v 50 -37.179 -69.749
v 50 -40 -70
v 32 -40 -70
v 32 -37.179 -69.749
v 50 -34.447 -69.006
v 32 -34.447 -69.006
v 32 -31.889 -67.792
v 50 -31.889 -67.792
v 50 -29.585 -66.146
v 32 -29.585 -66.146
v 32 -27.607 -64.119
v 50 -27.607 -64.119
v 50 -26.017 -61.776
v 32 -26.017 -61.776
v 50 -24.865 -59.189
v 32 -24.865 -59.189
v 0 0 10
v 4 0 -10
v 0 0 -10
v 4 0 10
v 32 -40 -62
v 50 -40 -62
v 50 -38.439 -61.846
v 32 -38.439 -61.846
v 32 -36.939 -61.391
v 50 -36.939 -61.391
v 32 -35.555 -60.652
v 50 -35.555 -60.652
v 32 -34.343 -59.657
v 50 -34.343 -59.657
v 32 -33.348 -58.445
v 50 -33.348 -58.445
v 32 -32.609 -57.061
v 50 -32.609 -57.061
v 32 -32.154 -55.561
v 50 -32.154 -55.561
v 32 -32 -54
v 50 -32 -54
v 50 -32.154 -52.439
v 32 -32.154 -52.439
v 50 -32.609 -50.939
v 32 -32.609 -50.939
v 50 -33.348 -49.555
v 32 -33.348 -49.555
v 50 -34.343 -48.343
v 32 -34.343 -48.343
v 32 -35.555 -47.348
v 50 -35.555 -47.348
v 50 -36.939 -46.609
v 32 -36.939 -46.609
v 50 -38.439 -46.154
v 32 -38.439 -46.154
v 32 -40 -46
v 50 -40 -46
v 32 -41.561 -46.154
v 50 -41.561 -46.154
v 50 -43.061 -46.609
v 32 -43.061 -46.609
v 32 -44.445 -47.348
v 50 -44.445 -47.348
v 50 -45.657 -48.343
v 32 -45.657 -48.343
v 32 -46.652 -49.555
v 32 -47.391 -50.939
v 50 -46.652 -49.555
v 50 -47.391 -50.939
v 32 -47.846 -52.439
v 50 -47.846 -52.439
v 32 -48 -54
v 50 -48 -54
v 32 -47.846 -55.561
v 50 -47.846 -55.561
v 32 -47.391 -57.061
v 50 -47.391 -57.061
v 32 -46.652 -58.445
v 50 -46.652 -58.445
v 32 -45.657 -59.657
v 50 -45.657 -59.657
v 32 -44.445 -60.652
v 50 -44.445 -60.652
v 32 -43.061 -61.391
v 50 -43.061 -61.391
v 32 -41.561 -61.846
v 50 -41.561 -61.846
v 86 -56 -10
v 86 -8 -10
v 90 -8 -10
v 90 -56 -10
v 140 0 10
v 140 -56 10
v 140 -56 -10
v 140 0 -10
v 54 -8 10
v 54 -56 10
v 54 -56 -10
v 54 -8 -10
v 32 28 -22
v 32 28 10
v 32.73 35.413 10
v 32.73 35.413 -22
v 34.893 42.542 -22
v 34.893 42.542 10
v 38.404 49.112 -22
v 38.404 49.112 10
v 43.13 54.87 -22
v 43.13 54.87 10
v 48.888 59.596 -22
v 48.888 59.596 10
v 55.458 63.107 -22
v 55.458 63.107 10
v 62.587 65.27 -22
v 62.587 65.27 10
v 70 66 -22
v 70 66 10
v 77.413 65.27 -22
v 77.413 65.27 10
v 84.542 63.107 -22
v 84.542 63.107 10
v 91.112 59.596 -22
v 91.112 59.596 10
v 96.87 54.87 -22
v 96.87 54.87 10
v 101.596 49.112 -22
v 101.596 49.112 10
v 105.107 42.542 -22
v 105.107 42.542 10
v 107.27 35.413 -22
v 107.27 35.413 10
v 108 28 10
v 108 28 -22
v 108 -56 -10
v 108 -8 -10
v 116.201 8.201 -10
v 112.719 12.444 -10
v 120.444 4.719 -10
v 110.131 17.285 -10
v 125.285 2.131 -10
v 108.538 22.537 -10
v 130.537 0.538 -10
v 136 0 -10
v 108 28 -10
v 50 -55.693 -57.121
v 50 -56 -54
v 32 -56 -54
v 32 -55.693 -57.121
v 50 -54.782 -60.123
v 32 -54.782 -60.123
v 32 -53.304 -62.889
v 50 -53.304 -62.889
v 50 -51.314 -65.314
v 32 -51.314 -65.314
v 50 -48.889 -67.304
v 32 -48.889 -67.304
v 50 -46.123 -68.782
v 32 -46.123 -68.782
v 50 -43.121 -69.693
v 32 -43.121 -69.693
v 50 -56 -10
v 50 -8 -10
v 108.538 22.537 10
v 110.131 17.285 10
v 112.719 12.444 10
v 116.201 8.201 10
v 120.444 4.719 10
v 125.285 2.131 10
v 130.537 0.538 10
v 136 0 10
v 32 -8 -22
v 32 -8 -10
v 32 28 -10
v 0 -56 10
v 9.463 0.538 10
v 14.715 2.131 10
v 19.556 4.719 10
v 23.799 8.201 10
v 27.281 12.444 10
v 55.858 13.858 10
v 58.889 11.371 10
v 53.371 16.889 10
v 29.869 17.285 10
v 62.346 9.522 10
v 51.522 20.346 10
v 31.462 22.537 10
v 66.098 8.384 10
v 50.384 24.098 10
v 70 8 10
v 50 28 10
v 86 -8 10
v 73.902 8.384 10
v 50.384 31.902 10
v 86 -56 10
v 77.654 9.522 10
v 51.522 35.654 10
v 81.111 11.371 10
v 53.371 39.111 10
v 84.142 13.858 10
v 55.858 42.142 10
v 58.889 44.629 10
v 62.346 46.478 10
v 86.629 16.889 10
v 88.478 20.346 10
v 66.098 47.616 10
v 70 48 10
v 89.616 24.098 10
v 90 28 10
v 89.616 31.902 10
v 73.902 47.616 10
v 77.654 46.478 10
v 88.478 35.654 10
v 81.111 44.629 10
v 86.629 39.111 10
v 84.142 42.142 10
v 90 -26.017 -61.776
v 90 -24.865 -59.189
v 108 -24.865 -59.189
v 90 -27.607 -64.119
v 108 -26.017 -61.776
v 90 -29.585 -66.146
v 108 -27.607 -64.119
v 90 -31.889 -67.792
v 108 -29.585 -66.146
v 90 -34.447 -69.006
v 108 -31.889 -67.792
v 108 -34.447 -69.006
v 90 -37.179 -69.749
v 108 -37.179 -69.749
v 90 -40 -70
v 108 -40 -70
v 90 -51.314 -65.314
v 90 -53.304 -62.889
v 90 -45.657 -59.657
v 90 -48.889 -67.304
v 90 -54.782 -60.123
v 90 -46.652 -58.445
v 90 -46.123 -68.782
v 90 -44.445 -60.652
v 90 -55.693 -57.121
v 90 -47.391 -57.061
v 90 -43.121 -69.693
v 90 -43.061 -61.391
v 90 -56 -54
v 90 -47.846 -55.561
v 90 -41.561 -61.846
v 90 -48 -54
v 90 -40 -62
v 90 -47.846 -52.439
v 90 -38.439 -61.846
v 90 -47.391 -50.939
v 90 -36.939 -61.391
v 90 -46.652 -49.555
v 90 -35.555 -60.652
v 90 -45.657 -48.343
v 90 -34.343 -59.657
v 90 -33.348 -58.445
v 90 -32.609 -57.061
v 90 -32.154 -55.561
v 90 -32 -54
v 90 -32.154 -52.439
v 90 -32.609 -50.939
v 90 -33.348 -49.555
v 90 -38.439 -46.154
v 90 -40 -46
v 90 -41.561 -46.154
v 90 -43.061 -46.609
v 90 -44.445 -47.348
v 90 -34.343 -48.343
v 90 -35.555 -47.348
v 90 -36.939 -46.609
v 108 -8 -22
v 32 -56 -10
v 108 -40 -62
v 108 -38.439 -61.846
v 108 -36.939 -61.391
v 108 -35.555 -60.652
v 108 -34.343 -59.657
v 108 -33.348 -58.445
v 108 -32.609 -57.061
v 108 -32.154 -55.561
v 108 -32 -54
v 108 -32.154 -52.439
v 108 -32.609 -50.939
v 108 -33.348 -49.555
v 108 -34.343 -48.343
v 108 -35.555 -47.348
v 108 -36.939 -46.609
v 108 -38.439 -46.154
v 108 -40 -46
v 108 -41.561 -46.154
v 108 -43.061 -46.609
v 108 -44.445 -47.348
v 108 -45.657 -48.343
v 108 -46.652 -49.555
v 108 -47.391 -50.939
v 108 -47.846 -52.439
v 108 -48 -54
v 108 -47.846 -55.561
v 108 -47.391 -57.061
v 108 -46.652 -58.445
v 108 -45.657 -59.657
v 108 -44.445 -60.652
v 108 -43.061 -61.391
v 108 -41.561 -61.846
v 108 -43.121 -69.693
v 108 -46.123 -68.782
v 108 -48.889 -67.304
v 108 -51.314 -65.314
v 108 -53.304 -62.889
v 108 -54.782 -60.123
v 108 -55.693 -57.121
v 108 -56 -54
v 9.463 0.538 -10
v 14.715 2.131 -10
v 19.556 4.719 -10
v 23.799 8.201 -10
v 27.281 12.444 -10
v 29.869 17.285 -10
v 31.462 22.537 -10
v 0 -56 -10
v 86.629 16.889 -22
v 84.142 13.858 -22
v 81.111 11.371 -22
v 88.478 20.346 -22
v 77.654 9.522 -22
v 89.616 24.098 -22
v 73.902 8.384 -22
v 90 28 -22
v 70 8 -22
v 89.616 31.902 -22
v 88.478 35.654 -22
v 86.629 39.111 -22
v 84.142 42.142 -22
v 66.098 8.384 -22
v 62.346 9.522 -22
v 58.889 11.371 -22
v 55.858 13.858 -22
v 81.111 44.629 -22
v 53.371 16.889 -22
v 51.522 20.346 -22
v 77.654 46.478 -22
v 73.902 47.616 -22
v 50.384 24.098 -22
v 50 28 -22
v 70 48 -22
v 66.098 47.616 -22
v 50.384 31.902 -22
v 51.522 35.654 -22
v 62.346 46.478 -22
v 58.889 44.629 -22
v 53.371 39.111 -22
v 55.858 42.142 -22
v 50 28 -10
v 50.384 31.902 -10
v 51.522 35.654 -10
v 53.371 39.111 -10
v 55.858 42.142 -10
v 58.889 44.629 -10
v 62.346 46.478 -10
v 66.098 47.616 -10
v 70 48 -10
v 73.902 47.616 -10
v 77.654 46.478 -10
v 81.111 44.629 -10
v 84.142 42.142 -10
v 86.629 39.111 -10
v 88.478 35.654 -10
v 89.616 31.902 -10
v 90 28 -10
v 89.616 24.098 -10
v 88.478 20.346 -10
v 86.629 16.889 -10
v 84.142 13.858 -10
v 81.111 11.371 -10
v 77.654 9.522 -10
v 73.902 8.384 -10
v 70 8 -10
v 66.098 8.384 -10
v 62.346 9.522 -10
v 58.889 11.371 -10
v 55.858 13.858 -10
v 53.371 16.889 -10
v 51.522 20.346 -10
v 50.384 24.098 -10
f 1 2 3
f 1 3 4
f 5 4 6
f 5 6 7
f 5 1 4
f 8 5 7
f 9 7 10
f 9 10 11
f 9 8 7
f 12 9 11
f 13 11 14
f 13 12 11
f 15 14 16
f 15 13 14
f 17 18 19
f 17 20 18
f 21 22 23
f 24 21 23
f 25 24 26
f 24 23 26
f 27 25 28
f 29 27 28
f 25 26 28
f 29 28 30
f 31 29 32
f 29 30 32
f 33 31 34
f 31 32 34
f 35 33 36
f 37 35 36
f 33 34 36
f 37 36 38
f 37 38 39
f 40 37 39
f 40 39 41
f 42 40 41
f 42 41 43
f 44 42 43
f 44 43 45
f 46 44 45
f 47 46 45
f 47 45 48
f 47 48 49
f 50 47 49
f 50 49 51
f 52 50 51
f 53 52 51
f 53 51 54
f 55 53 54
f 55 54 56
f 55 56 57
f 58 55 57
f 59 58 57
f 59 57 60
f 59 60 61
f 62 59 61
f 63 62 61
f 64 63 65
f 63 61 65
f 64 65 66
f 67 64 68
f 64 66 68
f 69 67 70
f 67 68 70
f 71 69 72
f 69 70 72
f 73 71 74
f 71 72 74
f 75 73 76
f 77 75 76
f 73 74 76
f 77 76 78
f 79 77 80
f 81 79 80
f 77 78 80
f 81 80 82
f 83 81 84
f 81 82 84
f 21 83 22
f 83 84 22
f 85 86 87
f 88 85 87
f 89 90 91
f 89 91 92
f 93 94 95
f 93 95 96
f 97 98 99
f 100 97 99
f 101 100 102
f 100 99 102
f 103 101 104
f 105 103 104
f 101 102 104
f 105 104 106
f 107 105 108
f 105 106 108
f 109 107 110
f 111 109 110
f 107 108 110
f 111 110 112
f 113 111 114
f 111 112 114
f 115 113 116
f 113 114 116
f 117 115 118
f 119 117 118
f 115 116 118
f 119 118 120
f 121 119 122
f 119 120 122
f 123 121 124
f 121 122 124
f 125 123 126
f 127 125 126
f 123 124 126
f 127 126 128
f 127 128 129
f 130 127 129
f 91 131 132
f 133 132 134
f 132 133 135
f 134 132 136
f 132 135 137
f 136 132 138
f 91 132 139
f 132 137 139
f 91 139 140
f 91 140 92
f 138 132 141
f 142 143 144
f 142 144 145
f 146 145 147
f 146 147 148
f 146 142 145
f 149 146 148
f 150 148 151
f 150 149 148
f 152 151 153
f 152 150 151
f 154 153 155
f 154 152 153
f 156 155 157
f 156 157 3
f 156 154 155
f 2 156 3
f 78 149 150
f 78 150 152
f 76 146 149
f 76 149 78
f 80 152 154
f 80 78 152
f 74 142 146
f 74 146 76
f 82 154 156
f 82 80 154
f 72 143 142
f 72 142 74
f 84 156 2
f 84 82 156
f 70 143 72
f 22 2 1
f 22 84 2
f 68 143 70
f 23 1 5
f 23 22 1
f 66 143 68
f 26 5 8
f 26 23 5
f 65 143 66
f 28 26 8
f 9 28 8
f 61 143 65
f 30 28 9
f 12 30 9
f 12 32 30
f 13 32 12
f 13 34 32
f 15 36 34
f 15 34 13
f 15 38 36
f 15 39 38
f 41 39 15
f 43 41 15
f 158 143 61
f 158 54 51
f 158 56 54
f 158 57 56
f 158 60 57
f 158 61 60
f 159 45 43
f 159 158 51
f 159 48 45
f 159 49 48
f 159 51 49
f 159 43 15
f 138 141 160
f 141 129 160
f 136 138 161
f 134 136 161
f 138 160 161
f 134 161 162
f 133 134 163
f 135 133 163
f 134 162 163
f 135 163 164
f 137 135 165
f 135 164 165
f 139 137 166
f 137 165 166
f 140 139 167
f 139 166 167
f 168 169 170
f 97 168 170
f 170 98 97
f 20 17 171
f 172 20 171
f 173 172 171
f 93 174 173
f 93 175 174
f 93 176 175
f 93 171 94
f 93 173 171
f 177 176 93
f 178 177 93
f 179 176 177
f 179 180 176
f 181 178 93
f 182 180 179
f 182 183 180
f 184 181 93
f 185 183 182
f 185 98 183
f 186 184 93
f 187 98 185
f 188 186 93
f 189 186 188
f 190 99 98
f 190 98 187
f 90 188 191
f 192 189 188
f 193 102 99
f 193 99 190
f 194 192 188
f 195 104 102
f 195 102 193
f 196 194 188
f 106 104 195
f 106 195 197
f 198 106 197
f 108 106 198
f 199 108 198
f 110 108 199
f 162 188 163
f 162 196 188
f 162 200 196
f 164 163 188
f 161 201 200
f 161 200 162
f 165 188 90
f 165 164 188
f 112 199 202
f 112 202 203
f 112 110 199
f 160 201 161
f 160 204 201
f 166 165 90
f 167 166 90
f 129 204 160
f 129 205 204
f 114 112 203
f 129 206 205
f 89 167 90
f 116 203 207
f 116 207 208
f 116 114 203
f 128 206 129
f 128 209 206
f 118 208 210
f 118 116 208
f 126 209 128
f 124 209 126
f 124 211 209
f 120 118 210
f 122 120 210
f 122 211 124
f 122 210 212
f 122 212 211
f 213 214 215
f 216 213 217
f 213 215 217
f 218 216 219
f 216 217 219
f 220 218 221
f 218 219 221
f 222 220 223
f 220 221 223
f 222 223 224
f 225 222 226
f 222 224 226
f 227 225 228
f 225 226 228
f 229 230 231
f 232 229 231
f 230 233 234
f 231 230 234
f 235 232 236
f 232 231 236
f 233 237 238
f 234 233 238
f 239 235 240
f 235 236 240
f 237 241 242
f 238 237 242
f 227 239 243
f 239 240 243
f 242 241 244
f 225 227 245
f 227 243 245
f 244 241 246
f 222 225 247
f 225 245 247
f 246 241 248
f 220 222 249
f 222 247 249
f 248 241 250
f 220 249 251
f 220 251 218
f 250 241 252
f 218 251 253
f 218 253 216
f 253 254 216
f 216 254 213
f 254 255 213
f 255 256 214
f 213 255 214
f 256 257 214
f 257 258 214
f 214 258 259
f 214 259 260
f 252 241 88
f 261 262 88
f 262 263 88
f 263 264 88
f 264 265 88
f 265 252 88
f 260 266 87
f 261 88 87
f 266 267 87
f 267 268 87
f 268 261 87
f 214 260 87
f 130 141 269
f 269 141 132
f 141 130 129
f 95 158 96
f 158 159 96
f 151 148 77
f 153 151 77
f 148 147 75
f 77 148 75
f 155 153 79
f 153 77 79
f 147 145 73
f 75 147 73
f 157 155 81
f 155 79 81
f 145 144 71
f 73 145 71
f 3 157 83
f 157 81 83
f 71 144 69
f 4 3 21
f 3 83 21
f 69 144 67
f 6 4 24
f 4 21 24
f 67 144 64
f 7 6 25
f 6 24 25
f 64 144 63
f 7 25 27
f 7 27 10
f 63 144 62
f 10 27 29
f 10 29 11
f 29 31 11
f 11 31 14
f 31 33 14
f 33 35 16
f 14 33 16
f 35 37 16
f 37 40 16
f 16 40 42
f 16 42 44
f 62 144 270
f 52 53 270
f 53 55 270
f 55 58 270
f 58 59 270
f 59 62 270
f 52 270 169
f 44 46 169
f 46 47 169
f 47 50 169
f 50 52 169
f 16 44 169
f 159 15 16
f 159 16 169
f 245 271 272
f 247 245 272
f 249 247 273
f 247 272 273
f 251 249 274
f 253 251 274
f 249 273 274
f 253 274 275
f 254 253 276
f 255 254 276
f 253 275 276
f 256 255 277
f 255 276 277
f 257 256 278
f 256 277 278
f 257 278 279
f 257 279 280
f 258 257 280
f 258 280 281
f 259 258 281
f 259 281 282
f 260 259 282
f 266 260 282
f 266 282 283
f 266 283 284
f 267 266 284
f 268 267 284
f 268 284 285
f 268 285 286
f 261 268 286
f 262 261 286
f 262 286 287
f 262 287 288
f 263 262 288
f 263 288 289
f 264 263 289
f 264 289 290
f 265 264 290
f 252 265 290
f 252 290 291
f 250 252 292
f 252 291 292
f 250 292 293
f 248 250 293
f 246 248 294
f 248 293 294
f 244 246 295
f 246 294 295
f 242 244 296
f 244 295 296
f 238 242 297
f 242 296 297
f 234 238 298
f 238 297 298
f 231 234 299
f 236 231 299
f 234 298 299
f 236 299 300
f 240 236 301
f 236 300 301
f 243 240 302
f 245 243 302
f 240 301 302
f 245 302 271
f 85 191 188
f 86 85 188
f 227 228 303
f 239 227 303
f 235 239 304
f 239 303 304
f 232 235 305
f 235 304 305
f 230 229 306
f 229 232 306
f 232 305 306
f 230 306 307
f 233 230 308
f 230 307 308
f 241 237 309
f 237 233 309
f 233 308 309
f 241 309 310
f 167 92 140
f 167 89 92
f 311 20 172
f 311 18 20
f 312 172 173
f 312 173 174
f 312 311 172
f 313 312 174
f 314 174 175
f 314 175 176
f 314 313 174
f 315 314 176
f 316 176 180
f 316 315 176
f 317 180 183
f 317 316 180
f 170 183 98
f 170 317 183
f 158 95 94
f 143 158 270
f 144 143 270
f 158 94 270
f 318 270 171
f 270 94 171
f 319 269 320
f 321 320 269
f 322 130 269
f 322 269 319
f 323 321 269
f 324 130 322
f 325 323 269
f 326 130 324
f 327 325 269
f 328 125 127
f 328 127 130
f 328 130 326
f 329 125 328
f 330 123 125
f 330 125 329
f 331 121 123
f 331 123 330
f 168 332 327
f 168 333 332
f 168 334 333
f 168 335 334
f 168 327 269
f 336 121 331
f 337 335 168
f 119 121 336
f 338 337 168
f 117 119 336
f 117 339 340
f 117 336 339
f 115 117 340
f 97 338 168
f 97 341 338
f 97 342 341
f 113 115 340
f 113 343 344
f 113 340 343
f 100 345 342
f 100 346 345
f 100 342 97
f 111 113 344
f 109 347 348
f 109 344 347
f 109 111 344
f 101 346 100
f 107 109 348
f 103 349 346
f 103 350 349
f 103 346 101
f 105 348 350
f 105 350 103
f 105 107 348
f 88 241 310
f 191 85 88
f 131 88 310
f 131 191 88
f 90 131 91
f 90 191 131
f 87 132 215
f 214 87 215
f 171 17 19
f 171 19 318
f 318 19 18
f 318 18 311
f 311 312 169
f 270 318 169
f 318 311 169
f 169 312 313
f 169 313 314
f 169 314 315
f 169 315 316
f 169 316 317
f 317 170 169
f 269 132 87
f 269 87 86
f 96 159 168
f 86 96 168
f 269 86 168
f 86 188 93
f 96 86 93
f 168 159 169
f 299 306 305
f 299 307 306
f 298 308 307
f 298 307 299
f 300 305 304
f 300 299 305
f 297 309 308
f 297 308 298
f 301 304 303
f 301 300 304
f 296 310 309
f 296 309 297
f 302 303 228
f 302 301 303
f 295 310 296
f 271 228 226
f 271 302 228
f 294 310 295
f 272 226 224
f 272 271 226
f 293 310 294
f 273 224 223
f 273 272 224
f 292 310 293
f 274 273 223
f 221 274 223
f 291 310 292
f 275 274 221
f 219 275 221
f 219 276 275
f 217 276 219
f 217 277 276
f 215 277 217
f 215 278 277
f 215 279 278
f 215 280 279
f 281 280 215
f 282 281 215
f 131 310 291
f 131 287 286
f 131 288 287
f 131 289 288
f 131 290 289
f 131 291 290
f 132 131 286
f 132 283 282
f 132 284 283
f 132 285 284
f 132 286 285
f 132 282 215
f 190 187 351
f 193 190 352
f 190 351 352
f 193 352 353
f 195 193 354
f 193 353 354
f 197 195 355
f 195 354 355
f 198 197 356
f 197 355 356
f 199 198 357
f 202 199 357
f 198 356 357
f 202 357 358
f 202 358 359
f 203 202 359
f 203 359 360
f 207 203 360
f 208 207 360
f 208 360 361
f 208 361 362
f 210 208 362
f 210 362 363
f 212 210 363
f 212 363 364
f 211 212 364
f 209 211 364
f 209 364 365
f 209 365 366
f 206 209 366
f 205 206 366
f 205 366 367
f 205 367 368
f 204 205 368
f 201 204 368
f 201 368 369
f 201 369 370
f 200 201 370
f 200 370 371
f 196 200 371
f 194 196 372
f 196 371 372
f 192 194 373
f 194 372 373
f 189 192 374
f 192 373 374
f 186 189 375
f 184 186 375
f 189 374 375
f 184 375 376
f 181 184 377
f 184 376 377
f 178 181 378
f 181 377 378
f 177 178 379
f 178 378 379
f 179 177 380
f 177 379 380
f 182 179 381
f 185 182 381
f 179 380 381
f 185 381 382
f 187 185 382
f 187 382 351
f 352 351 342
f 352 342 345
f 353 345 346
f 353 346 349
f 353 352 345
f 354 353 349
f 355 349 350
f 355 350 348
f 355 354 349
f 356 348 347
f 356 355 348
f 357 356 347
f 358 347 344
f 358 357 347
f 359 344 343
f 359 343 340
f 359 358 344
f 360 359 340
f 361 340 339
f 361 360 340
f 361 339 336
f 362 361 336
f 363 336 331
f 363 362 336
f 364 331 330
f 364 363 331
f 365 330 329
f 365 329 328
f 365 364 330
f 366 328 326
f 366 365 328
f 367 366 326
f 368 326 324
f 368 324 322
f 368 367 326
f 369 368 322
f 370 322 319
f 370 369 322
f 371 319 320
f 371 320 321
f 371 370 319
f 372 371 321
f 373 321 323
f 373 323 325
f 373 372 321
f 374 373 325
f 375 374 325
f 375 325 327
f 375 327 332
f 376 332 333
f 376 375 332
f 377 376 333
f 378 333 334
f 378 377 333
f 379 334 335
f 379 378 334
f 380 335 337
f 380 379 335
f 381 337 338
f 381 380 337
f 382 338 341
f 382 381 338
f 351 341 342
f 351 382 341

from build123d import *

# Parameters (mm, degrees)
BOSS_EXTRUDE2_DEPTH = 10
FILLET3_R           = 28
SKETCH4_W           = 22
SKETCH4_H           = 48
BOSS_EXTRUDE4_DEPTH = 20
SKETCH9_W           = 18
SKETCH9_H           = 48
BOSS_EXTRUDE6_DEPTH = 60
CUT_EXTRUDE2_DEPTH  = 60
SKETCH12_W          = 18
SKETCH12_H          = 48
BOSS_EXTRUDE7_DEPTH = 60
CUT_EXTRUDE3_START  = -60
CUT_EXTRUDE3_DEPTH  = 60
SKETCH14_R          = 8
CUT_EXTRUDE4_DEPTH  = 140
SKETCH15_R          = 20
CUT_EXTRUDE5_DEPTH  = 140
SKETCH18_R          = 20
BOSS_EXTRUDE9_DEPTH = 12


with BuildPart() as part:
    # Sketch2 → Boss-Extrude2 (new, symmetric)
    with BuildSketch(Plane.XY):
        with BuildLine():
            Line((32, 0), (0, 0))
            Line((0, 0), (0, -56))
            Line((0, -56), (32, -56))
            Line((32, -56), (32, -8))
            Line((32, -8), (89.338383838, -8))
            Line((89.338383838, -8), (108, -8))
            Line((108, -8), (108, -56))
            Line((108, -56), (140, -56))
            Line((140, -56), (140, 0))
            Line((140, 0), (108, 0))
            Line((108, 0), (108, 28))
            ThreePointArc((108, 28), (70, 66), (32, 28))
            Line((32, 28), (32, 0))
        make_face()
    extrude(amount=BOSS_EXTRUDE2_DEPTH, both=True)

    # Fillet3
    fillet3_edges = [part.edges().sort_by_distance(p)[0] for p in [
        (32, 0, 0),
        (108, 0, 0),
    ]]
    fillet(fillet3_edges, radius=FILLET3_R - 0.0001)  # a hair under: the kernel refuses the full size

    # Sketch4 → Boss-Extrude4 (add, through all)
    with BuildSketch(Plane.XY.offset(10)):
        with Locations((97, -32)):
            Rectangle(SKETCH4_W, SKETCH4_H)
        with Locations((43, -32)):
            Rectangle(SKETCH4_W, SKETCH4_H)
    extrude(amount=-BOSS_EXTRUDE4_DEPTH)

    # Sketch9 → Boss-Extrude6 (add)
    with BuildSketch(Plane(origin=(0, 0, -10), x_dir=(-1, 0, 0), z_dir=(0, 0, -1))):
        with Locations((-99, -32)):
            Rectangle(SKETCH9_W, SKETCH9_H)
    extrude(amount=BOSS_EXTRUDE6_DEPTH)

    # Sketch10 → Cut-Extrude2 (cut)
    with BuildSketch(Plane(origin=(108, 0, 0), x_dir=(0, 0, -1), z_dir=(1, 0, 0))):
        with BuildLine():
            Line((70, -8), (10, -8))
            Line((10, -8), (59.189189189, -24.864864865))
            ThreePointArc((59.189189189, -24.864864865), (67.019735539, -30.7001889), (70, -40))
            Line((70, -40), (70, -8))
        make_face()
        with BuildLine():
            Line((70, -56), (70, -40))
            ThreePointArc((70, -40), (65.313708499, -51.313708499), (54, -56))
            Line((54, -56), (70, -56))
        make_face()
    extrude(amount=-CUT_EXTRUDE2_DEPTH, mode=Mode.SUBTRACT)

    # Sketch12 → Boss-Extrude7 (add)
    with BuildSketch(Plane(origin=(0, 0, -10), x_dir=(-1, 0, 0), z_dir=(0, 0, -1))):
        with Locations((-41, -32)):
            Rectangle(SKETCH12_W, SKETCH12_H)
    extrude(amount=BOSS_EXTRUDE7_DEPTH)

    # Sketch13 → Cut-Extrude3 (cut)
    with BuildSketch(Plane.ZY.offset(-32).offset(CUT_EXTRUDE3_START)):
        with BuildLine():
            Line((-70, -8), (-70, -40))
            ThreePointArc((-70, -40), (-67.019735539, -30.7001889), (-59.189189189, -24.864864865))
            Line((-59.189189189, -24.864864865), (-10, -8))
            Line((-10, -8), (-70, -8))
        make_face()
        with BuildLine():
            Line((-70, -40), (-70, -56))
            Line((-70, -56), (-54, -56))
            ThreePointArc((-54, -56), (-65.313708499, -51.313708499), (-70, -40))
        make_face()
    extrude(amount=CUT_EXTRUDE3_DEPTH, mode=Mode.SUBTRACT)

    # Sketch14 → Cut-Extrude4 (cut)
    with BuildSketch(Plane(origin=(108, 0, 0), x_dir=(0, 0, -1), z_dir=(1, 0, 0))):
        with Locations((54, -40)):
            Circle(SKETCH14_R)
    extrude(amount=-CUT_EXTRUDE4_DEPTH, mode=Mode.SUBTRACT)

    # Sketch15 → Cut-Extrude5 (cut)
    with BuildSketch(Plane(origin=(0, 0, -10), x_dir=(-1, 0, 0), z_dir=(0, 0, -1))):
        with Locations((-70, 28)):
            Circle(SKETCH15_R)
    extrude(amount=-CUT_EXTRUDE5_DEPTH, mode=Mode.SUBTRACT)

    # Sketch18 → Boss-Extrude9 (add)
    with BuildSketch(Plane(origin=(0, 0, -10), x_dir=(-1, 0, 0), z_dir=(0, 0, -1))):
        with BuildLine():
            Line((-108, 28), (-108, -8))
            Line((-108, -8), (-32, -8))
            Line((-32, -8), (-32, 28))
            ThreePointArc((-32, 28), (-70, 66), (-108, 28))
        make_face()
        with Locations((-70, 28)):
            Circle(SKETCH18_R, mode=Mode.SUBTRACT)
    extrude(amount=BOSS_EXTRUDE9_DEPTH)


solid = part.part
